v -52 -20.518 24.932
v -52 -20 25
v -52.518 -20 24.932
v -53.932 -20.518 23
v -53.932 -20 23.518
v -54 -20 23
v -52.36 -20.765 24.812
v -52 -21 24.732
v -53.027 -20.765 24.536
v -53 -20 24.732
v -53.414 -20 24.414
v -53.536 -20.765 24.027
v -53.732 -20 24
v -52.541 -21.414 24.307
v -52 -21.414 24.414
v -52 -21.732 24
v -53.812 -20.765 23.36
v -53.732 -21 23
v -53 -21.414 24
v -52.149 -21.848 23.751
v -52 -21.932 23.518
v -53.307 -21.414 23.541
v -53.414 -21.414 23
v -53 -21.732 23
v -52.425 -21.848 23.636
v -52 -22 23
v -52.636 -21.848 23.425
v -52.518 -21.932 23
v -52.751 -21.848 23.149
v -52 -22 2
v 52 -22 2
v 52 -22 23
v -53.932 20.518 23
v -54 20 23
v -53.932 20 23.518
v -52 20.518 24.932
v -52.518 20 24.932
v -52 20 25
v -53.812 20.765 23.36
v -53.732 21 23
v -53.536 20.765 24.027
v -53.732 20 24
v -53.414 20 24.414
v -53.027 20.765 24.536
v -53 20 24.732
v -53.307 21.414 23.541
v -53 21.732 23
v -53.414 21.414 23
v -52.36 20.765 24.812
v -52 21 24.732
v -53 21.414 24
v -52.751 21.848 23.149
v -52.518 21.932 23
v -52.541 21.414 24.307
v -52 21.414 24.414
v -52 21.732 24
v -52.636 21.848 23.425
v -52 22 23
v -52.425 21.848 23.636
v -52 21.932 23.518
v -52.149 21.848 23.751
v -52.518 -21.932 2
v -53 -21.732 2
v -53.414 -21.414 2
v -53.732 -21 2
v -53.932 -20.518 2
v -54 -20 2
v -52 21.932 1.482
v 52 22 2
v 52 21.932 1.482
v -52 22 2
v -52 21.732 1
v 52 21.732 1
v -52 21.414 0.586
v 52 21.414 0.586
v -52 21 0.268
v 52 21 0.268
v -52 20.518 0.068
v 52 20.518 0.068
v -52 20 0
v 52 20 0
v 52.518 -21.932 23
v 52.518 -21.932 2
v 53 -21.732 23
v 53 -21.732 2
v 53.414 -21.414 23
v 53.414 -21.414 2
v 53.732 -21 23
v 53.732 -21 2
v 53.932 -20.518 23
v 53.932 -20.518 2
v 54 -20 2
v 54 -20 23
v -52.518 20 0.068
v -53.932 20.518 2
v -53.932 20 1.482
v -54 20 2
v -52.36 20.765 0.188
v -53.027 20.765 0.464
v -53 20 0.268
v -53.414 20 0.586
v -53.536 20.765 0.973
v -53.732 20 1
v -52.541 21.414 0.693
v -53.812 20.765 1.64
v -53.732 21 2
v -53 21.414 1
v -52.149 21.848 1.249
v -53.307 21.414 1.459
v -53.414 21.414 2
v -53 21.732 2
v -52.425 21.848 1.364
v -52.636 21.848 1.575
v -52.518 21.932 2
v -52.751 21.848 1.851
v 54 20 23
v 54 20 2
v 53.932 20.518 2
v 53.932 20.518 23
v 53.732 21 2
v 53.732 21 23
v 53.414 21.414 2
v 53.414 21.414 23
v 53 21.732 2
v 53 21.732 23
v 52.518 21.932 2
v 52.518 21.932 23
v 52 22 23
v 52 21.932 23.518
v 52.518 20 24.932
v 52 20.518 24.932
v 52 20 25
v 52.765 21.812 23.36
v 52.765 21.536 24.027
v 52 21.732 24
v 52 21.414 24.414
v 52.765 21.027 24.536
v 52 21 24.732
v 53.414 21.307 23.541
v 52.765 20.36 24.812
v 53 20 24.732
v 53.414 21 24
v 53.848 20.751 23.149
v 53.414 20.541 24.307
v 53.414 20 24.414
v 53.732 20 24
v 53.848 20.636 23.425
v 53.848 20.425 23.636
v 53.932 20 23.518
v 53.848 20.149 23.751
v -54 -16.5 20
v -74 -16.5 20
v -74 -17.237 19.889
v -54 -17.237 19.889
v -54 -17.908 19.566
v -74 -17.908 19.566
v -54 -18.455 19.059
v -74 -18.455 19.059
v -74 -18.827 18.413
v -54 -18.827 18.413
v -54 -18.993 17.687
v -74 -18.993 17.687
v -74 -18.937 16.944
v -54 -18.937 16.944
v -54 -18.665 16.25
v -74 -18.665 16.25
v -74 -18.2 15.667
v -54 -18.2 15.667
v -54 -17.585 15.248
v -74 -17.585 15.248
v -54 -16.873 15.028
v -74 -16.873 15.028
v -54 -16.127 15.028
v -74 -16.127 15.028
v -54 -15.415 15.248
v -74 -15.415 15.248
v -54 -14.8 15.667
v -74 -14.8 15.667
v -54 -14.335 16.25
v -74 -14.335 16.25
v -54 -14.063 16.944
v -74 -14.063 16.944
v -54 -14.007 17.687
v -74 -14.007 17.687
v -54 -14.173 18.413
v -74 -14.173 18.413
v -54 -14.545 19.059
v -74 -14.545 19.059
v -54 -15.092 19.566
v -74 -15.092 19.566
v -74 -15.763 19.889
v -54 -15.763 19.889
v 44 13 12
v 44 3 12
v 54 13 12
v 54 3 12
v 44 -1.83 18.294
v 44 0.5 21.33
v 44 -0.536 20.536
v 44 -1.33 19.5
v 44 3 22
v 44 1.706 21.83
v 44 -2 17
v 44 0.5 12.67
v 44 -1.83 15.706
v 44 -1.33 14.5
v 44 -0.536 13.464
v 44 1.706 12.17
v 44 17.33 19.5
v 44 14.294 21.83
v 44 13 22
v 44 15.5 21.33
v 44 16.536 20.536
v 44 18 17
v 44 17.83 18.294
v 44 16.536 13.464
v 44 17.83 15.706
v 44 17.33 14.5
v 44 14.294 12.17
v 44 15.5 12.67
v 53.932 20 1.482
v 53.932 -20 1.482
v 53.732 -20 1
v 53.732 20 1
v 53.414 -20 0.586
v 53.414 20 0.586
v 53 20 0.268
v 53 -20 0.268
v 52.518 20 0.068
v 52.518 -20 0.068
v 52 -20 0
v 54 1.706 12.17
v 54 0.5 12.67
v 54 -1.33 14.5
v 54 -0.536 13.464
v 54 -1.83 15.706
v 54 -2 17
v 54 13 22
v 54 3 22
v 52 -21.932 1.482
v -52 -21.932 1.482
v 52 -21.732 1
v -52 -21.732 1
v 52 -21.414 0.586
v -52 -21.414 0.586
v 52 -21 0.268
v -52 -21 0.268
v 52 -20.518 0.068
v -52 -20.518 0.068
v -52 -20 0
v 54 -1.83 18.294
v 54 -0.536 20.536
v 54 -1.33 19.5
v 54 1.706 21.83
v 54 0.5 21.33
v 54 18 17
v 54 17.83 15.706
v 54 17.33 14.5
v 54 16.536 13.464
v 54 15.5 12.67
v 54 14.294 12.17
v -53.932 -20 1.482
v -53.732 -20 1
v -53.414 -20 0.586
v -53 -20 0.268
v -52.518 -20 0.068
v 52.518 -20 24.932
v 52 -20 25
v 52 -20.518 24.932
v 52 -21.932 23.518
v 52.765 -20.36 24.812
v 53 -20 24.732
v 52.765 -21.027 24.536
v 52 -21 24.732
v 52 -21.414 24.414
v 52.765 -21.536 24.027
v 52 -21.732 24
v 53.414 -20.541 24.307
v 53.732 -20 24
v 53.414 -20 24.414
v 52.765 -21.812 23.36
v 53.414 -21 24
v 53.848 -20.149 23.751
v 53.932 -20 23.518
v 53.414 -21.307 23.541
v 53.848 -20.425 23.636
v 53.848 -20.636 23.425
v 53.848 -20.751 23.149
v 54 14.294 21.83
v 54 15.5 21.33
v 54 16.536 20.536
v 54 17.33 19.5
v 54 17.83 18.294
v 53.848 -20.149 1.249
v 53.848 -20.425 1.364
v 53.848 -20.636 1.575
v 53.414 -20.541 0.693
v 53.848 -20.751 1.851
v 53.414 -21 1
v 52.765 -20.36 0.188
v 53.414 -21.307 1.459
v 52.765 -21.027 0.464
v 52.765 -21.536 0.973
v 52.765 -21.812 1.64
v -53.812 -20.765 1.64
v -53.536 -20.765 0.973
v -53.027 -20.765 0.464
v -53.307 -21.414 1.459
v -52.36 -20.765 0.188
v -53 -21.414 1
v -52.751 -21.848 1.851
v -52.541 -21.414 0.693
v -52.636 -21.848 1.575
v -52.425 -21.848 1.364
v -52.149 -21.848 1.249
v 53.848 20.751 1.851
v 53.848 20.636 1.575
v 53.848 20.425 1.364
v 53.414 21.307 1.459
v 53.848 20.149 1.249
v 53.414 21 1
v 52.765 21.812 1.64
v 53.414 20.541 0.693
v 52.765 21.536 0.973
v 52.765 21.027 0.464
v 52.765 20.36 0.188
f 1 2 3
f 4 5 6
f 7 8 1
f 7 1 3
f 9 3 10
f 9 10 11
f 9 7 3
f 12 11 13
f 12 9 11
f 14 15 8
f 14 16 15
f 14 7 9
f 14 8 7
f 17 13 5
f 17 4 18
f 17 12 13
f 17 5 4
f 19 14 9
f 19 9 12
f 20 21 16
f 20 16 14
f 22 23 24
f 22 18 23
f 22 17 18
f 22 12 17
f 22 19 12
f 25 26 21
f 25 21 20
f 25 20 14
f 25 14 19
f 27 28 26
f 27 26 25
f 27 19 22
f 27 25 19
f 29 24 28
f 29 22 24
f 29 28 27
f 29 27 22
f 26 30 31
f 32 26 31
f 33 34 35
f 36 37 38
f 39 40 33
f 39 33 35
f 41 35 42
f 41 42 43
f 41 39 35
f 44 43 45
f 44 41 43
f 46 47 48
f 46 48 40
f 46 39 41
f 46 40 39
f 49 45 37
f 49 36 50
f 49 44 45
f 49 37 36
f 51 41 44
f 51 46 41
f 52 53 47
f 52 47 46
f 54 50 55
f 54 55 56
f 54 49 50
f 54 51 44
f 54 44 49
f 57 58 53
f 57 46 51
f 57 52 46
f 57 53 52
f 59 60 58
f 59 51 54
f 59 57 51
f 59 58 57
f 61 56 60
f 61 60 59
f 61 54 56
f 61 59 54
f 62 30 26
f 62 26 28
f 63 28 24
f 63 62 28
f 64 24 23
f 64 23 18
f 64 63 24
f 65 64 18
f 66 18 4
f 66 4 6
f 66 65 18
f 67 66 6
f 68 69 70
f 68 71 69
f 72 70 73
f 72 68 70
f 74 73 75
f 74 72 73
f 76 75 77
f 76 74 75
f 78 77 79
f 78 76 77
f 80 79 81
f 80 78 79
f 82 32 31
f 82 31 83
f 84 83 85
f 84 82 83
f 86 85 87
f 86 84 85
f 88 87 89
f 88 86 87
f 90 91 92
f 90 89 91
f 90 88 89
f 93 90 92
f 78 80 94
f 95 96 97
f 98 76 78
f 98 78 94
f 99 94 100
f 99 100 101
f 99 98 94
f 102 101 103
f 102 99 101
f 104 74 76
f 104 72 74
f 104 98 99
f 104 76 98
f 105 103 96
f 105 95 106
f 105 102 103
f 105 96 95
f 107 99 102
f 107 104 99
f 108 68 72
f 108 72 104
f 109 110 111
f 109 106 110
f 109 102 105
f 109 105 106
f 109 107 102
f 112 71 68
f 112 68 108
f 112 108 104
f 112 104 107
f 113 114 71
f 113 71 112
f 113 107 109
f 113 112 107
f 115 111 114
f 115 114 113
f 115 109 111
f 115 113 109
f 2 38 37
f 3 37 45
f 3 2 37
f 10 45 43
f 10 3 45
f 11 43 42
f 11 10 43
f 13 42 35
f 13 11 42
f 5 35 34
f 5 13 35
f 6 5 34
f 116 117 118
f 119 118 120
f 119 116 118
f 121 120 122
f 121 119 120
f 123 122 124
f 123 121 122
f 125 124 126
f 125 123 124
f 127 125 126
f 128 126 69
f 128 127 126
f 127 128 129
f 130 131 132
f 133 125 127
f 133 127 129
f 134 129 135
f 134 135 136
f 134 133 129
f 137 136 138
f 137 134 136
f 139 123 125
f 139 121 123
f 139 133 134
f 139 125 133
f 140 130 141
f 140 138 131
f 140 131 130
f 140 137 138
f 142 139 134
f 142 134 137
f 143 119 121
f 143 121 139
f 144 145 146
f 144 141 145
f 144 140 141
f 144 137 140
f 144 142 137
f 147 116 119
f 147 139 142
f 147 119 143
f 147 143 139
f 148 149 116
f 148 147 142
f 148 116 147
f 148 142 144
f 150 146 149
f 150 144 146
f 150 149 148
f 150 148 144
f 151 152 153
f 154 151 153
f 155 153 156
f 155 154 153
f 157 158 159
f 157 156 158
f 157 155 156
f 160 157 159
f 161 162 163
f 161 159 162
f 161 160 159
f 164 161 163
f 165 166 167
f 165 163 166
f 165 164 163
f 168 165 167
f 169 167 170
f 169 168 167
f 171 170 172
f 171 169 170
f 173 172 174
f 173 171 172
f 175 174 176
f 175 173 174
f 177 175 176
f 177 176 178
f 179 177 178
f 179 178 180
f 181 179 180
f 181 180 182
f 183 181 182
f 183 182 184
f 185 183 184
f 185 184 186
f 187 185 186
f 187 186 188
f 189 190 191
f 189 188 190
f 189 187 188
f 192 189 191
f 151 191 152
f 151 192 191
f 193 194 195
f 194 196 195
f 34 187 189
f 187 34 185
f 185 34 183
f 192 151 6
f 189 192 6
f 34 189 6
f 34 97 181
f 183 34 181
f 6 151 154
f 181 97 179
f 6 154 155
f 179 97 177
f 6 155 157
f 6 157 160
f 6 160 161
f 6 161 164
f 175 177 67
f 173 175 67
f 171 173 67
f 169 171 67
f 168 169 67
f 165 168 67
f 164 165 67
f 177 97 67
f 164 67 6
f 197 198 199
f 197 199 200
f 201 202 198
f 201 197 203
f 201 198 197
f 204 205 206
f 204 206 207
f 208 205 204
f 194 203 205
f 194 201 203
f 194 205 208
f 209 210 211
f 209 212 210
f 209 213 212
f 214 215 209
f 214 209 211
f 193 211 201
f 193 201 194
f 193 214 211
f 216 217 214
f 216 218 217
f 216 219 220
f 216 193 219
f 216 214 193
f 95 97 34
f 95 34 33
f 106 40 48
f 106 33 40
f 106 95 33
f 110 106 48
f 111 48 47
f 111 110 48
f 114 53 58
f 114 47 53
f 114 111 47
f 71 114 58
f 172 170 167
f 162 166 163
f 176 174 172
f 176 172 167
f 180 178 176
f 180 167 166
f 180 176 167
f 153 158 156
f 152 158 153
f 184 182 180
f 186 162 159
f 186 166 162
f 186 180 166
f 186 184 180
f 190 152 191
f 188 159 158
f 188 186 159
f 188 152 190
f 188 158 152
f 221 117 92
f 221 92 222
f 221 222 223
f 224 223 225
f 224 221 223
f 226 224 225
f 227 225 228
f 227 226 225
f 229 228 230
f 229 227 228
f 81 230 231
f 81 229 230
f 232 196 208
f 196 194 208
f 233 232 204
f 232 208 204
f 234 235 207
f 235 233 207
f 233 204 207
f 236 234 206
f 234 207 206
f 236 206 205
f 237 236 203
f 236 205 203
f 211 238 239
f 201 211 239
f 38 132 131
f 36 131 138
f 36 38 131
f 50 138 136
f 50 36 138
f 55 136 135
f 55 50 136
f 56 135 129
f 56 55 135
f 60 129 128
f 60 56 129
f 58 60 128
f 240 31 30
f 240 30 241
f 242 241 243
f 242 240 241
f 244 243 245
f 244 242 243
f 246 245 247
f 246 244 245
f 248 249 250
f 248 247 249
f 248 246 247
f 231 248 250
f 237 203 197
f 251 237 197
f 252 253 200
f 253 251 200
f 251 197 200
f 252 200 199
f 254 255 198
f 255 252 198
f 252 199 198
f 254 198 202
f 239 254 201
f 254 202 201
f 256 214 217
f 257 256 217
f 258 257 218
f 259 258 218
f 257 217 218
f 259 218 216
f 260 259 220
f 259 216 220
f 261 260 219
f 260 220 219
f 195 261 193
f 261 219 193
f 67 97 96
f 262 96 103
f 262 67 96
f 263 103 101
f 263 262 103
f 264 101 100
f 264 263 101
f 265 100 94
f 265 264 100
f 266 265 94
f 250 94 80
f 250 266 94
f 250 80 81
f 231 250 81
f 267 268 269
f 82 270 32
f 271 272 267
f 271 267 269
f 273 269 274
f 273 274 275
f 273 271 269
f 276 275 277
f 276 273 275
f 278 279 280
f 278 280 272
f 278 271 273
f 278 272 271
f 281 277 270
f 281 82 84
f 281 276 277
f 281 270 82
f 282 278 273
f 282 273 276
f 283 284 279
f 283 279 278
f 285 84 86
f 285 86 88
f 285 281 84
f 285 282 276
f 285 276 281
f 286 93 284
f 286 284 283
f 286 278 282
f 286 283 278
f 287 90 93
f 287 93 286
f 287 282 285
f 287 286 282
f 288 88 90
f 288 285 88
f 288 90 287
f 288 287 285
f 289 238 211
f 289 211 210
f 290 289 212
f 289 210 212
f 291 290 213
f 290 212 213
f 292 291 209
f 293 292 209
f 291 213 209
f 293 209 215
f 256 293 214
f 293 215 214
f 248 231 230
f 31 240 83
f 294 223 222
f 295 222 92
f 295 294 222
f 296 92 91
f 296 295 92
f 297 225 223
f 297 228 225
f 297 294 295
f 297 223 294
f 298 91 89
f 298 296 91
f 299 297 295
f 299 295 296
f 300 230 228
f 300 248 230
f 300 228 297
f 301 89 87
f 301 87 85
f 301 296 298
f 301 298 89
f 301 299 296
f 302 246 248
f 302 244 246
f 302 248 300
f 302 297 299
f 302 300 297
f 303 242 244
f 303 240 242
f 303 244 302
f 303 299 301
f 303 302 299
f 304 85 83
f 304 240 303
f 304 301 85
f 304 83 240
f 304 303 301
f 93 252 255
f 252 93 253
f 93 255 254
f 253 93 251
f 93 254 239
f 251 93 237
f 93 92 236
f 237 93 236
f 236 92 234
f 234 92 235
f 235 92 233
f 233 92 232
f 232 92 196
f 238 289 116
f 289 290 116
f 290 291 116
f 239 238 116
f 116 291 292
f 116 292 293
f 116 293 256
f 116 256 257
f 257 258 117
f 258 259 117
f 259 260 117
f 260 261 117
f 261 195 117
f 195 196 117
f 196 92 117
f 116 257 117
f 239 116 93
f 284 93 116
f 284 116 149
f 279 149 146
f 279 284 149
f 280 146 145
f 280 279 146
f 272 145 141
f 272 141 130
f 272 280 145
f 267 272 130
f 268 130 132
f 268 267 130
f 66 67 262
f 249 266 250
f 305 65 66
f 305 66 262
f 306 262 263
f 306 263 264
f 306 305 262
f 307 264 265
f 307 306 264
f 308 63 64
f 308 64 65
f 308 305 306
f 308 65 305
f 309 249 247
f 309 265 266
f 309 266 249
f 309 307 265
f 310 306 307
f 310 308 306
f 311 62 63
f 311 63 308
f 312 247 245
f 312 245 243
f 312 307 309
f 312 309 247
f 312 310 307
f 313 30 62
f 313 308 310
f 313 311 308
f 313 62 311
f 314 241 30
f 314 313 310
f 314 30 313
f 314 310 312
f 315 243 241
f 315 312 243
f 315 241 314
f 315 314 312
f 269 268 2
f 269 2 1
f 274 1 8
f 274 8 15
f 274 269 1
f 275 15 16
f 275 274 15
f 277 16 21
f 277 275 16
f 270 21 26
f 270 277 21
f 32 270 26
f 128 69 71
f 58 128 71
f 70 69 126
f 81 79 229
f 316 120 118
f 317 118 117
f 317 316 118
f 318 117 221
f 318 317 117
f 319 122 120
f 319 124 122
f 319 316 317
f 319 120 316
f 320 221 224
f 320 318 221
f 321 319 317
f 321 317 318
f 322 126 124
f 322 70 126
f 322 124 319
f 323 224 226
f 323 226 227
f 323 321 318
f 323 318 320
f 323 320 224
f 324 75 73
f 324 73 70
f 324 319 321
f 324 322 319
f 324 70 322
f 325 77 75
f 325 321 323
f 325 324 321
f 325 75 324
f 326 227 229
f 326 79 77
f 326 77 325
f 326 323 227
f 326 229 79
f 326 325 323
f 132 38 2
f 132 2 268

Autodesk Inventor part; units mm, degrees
ref_plane "YZ Plane" through (0, 0, 0) normal (1, 0, 0) x (0, 1, 0)
ref_plane "XZ Plane" through (0, 0, 0) normal (0, 1, 0) x (-1, 0, 0)
ref_plane "XY Plane" through (0, 0, 0) normal (0, 0, 1) x (1, 0, 0)
sketch "Sketch1" plane through (0, 0, 0) normal (0, 0, 1) x (1, 0, 0)
  line L0 (54, 22) -> (-54, 22)
  line L1 (-54, 22) -> (-54, -22)
  line L2 (-54, -22) -> (54, -22)
  line L3 (54, -22) -> (54, 22)
  line L4 (-54, 0) -> (54, 0) construction
  line L5 (0, 22) -> (0, -22) construction
  point P0 (0, 0)
  point P1 (0, 0)
  dimension "d0" = 108
  dimension "d1" = 44
extrude "Extrusion1" add sketch "Sketch1" along normal blind 25
fillet "Fillet1" radius 2 9 edges at (0, 22, 25) (0, -22, 25) (0, -22, 0) (0, 22, 0) (54, 0, 0) (54, 22, 12.5) (54, -22, 12.5) (-54, 0, 25) (-54, 0, 0)
sketch "Sketch2" plane through (54, -20, 2) normal (1, 0, 0) x (0, 0, -1)
  line L0 (0, 0) -> (-23, 0) construction
  line L1 (0, 40) -> (0, 0) construction
  line L2 (-23, 40) -> (0, 40) construction
  line L3 (-23, 0) -> (-23, 40) construction
  line L4 (-20, 18) -> (-10, 18)
  line L5 (-10, 18) -> (-10, 38)
  line L6 (-10, 38) -> (-20, 38)
  line L7 (-20, 38) -> (-20, 18)
  point P0 (2, 20)
  dimension "d5" = 10
  dimension "d6" = 20
  dimension "d7" = 3
  dimension "d8" = 18
extrude "Extrusion2" cut sketch "Sketch2" against normal blind 10
sketch "Sketch3" plane through (-54, -22, 23) normal (-1, 0, 0) x (0, 0, 1)
  line L0 (0, 44) -> (0, 0) construction
  line L1 (-21, 0) -> (0, 0) construction
  circle A0 centre (-5.5, 5.5) radius 2.5
  point P0 (-23, 22)
  dimension "d11" = 5
  dimension "d13" = 3
  dimension "d14" = 3
extrude "Extrusion3" add sketch "Sketch3" along normal blind 20
fillet "Fillet2" radius 2 3 edges at (53.4142, 21.4142, 24.4142) (53.4142, -21.4142, 24.4142) (54, 0, 25)
fillet "Fillet3" radius 5 1 edges at (49, -2, 22)
fillet "Fillet4" radius 5 3 edges at (49, 18, 22) (49, 18, 12) (49, -2, 12)
fillet "Fillet5" radius 2 6 edges at (-53.4142, 21.4142, 24.4142) (-53.4142, 21.4142, 0.5858) (-54, 22, 12.5) (-53.4142, -21.4142, 24.4142) (-53.4142, -21.4142, 0.5858) (-54, -22, 12.5)
properties part number "Transformer" material "PET Plastic"
